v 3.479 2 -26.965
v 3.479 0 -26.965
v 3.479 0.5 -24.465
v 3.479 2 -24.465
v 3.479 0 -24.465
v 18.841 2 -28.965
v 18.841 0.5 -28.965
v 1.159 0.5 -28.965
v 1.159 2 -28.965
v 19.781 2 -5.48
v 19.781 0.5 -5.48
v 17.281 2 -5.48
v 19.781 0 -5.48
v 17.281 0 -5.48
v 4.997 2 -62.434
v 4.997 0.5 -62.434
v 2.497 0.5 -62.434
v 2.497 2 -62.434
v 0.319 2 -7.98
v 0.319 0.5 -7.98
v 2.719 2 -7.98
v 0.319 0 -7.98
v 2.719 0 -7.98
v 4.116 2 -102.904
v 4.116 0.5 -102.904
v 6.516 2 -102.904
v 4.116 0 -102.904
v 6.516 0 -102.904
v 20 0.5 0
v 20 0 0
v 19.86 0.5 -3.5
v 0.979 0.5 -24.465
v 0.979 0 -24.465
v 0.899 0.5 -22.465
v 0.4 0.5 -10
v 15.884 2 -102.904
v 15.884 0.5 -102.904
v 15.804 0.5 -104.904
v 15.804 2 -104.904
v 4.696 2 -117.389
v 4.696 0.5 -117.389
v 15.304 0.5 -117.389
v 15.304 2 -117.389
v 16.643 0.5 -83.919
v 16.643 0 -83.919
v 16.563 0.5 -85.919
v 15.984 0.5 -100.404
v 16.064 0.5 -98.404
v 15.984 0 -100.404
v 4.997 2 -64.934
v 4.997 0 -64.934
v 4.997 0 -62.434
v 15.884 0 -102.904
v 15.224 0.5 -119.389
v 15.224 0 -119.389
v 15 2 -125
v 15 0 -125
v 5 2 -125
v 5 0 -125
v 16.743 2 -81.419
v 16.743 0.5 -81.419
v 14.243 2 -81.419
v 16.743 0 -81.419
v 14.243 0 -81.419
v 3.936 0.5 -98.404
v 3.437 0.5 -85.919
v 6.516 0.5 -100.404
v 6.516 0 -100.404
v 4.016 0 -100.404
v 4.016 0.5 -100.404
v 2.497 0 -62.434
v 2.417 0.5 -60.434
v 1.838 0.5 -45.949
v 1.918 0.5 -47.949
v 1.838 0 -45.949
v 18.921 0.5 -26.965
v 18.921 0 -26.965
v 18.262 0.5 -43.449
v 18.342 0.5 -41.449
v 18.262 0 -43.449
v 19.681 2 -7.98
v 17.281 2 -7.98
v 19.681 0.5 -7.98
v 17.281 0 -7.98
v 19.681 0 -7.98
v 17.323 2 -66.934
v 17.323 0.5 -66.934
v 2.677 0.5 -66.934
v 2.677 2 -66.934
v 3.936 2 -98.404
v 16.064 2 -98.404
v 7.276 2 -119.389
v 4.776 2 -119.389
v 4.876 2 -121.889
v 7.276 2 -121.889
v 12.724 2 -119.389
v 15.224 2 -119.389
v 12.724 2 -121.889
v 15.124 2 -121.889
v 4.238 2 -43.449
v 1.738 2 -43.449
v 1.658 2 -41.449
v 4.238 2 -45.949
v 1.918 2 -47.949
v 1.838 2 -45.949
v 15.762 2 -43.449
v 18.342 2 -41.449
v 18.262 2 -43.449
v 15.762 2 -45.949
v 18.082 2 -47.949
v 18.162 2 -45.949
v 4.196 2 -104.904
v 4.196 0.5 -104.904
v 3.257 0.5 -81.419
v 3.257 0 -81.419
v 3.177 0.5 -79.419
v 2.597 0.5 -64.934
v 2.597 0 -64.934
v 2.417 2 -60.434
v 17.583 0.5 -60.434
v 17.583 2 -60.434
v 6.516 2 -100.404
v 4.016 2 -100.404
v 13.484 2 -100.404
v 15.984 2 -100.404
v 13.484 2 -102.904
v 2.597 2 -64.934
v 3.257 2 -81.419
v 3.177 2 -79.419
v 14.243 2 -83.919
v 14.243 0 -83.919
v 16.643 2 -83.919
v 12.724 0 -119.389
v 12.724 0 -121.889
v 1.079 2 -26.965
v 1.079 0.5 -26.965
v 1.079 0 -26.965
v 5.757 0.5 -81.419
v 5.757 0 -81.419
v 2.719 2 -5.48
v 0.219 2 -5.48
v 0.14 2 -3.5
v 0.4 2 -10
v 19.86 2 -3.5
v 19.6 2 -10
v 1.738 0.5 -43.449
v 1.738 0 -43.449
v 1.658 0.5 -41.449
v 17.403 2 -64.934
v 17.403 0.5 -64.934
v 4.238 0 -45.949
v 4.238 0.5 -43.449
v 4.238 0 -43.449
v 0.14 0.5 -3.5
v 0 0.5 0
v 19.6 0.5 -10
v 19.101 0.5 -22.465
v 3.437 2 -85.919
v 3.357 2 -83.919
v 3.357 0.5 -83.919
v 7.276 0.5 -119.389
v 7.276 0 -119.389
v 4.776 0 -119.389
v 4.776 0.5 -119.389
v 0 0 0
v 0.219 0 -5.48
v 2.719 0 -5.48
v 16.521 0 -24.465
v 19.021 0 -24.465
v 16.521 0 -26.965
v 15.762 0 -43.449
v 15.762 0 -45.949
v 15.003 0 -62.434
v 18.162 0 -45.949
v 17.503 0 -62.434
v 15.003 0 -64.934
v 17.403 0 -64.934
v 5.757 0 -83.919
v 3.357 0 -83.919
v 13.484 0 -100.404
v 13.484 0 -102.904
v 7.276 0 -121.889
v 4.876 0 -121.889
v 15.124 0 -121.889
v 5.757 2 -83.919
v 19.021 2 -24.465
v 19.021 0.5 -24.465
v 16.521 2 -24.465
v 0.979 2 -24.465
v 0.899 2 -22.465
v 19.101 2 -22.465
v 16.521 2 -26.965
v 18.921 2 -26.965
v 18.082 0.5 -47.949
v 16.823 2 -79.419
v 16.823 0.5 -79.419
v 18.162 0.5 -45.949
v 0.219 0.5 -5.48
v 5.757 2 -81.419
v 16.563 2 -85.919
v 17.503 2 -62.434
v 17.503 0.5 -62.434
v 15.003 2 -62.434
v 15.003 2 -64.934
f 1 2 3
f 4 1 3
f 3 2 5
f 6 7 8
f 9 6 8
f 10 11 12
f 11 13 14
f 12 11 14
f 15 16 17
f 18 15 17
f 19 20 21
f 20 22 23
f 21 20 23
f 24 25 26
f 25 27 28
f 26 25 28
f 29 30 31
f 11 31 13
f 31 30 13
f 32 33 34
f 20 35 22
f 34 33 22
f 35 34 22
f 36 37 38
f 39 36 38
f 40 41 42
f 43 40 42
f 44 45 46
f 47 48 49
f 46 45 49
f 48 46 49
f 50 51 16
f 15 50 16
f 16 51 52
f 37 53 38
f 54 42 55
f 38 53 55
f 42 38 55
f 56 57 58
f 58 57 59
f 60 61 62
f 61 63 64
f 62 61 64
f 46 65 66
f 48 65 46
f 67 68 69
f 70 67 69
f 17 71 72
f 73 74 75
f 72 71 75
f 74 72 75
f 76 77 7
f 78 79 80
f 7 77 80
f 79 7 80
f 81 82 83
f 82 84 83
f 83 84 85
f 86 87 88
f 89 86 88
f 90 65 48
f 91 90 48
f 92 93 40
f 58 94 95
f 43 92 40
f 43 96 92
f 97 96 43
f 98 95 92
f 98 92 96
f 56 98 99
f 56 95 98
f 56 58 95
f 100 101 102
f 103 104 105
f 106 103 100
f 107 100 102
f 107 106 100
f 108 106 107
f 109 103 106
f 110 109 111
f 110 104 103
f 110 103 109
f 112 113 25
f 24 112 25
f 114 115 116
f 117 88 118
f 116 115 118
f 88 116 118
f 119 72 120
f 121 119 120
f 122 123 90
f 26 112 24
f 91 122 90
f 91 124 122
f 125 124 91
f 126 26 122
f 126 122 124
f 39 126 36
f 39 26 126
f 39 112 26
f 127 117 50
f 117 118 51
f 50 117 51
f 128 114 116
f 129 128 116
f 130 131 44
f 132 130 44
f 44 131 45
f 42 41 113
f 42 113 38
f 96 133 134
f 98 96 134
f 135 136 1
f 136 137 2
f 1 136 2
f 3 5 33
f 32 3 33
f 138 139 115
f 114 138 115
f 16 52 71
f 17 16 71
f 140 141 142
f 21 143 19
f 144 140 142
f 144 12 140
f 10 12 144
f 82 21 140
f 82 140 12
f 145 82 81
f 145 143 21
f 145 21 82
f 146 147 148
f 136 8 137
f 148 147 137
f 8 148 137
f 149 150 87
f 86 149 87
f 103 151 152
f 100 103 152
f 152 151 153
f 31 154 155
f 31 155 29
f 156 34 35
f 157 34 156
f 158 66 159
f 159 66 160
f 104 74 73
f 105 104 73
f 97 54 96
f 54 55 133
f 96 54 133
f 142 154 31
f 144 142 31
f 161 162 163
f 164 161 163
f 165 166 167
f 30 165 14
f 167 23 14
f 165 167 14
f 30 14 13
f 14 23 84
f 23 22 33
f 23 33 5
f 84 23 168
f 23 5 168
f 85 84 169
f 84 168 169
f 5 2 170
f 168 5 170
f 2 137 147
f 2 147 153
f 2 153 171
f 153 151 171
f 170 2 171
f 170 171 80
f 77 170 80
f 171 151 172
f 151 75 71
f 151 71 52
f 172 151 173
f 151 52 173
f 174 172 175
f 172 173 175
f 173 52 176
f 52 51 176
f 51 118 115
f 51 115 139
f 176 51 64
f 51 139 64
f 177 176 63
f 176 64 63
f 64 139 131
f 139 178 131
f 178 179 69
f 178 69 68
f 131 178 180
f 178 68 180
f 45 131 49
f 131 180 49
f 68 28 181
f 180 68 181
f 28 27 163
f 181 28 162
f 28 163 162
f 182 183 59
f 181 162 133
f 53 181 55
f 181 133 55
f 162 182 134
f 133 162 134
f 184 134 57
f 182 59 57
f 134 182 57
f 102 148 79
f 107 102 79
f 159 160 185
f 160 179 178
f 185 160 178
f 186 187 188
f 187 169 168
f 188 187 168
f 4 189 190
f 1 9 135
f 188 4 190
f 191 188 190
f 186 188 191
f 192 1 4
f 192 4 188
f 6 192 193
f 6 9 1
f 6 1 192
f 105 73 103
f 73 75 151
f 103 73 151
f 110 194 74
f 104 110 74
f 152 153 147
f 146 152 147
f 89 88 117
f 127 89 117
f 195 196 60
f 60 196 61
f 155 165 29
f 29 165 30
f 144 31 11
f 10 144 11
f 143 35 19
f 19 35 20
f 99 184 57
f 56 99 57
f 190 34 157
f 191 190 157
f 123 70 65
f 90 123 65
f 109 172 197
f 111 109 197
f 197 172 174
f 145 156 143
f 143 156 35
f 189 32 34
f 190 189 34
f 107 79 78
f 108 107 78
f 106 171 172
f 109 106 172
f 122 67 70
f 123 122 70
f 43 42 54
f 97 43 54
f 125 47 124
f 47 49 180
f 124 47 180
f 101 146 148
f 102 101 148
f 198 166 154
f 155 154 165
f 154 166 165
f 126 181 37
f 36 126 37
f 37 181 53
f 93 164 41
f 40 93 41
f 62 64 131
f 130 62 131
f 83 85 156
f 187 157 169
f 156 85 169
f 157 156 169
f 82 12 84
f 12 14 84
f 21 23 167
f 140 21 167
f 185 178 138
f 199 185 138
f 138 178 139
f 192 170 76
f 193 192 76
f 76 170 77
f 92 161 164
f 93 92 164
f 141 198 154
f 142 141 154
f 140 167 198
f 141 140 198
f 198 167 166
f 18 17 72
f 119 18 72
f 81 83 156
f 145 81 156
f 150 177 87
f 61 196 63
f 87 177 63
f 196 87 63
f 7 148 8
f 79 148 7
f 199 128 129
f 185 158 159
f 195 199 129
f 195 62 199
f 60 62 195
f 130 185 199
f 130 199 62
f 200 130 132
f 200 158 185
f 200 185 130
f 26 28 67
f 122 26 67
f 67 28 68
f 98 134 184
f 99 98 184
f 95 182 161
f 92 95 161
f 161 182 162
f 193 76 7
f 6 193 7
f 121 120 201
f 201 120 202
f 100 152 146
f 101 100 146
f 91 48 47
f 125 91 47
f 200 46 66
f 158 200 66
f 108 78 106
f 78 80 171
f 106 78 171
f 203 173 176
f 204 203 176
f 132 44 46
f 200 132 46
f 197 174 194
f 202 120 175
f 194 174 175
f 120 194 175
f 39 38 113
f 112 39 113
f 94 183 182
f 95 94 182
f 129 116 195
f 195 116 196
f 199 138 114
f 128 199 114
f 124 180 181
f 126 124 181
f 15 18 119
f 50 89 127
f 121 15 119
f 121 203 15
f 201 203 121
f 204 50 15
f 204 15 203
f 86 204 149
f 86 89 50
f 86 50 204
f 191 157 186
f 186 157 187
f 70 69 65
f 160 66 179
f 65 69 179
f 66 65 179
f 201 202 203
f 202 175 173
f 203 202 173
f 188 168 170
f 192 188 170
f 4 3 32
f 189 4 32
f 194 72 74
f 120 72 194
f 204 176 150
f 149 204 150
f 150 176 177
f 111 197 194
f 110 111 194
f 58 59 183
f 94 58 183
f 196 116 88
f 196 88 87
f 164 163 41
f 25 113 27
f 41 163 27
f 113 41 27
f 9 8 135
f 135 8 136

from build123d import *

# Parameters (mm, degrees)
BOSS_EXTRUDE1_DEPTH = 0.5
BOSS_EXTRUDE2_DEPTH = 1.5


with BuildPart() as part:
    # Sketch2 → Boss-Extrude1 (new body)
    with BuildSketch(Plane(origin=(0, 0, 0), x_dir=(1, 0, 0), z_dir=(0, 1, 0))):
        Polygon((0.219191575, 5.479789367), (0, 0), (20, 0), (19.780808425, 5.479789367), (17.280808425, 5.479789367), (17.280808425, 7.979789367), (19.680808425, 7.979789367), (19.021415697, 24.464607583), (16.521415698, 24.464607583), (16.521415698, 26.964607583), (18.921415697, 26.964607583), (18.262022968, 43.449425798), (15.76202297, 43.449425798), (15.76202297, 45.949425798), (18.162022968, 45.949425798), (17.502630239, 62.434244014), (15.002630242, 62.434244014), (15.002630242, 64.934244014), (17.402630239, 64.934244014), (16.743237511, 81.41906223), (14.243237514, 81.41906223), (14.243237514, 83.91906223), (16.643237511, 83.91906223), (15.983844782, 100.403880446), (13.483844787, 100.403880446), (13.483844787, 102.903880446), (15.883844782, 102.903880446), (15.224452054, 119.388698661), (12.724452059, 119.388698661), (12.724452059, 121.888698661), (15.124452054, 121.888698661), (15, 125), (5, 125), (4.875547946, 121.888698661), (7.275547941, 121.888698661), (7.275547941, 119.388698661), (4.775547941, 119.388698661), (4.116155218, 102.903880446), (6.516155213, 102.903880446), (6.516155213, 100.403880446), (4.016155213, 100.403880446), (3.356762489, 83.91906223), (5.756762486, 83.91906223), (5.756762486, 81.41906223), (3.256762486, 81.41906223), (2.597369761, 64.934244014), (4.997369758, 64.934244014), (4.997369758, 62.434244014), (2.497369758, 62.434244014), (1.837977032, 45.949425798), (4.23797703, 45.949425798), (4.23797703, 43.449425798), (1.73797703, 43.449425798), (1.078584303, 26.964607583), (3.478584302, 26.964607583), (3.478584302, 24.464607583), (0.978584302, 24.464607583), (0.319191575, 7.979789367), (2.719191575, 7.979789367), (2.719191575, 5.479789367), align=None)
    extrude(amount=BOSS_EXTRUDE1_DEPTH)

    # Sketch3 → Boss-Extrude2 (add)
    with BuildSketch(Plane(origin=(0, 0.5, 0), x_dir=(1, 0, 0), z_dir=(0, 1, 0))):
        Polygon((0.219191575, 5.479789367), (0.14, 3.5), (19.86, 3.5), (19.780808425, 5.479789367), (17.280808425, 5.479789367), (17.280808425, 7.979789367), (19.680808425, 7.979789367), (19.6, 10), (0.4, 10), (0.319191575, 7.979789367), (2.719191575, 7.979789367), (2.719191575, 5.479789367), align=None)
        Polygon((0.978584302, 24.464607561), (0.898584302, 22.464607561), (19.101415698, 22.464607561), (19.021415697, 24.464607583), (16.521415698, 24.464607583), (16.521415698, 26.964607583), (18.921415697, 26.964607583), (18.841415697, 28.964607583), (1.158584303, 28.964607583), (1.078584303, 26.964607583), (3.478584302, 26.964607583), (3.478584302, 24.464607583), align=None)
        Polygon((1.73797703, 43.449425755), (1.657977032, 41.449425798), (18.342022968, 41.449425798), (18.262022968, 43.449425798), (15.76202297, 43.449425798), (15.76202297, 45.949425798), (18.162022968, 45.949425798), (18.082022968, 47.949425798), (1.917977032, 47.949425798), (1.837977032, 45.949425798), (4.23797703, 45.949425798), (4.23797703, 43.449425798), align=None)
        Polygon((2.497369758, 62.434243949), (2.417369761, 60.434244014), (17.582630239, 60.434244014), (17.502630239, 62.434244014), (15.002630242, 62.434244014), (15.002630242, 64.934244014), (17.402630239, 64.934244014), (17.322630239, 66.934244014), (2.677369761, 66.934244014), (2.597369761, 64.934244014), (4.997369758, 64.934244014), (4.997369758, 62.434244014), align=None)
        Polygon((3.256762486, 81.419062142), (3.176762489, 79.41906223), (16.823237511, 79.41906223), (16.743237511, 81.41906223), (14.243237514, 81.41906223), (14.243237514, 83.91906223), (16.643237511, 83.91906223), (16.563237511, 85.91906223), (3.436762489, 85.91906223), (3.356762489, 83.91906223), (5.756762486, 83.91906223), (5.756762486, 81.41906223), align=None)
        Polygon((4.016155213, 100.403880336), (3.936155218, 98.403880446), (16.063844782, 98.403880446), (15.983844782, 100.403880446), (13.483844787, 100.403880446), (13.483844787, 102.903880446), (15.883844782, 102.903880446), (15.803844782, 104.903880446), (4.196155218, 104.903880446), (4.116155218, 102.903880446), (6.516155213, 102.903880446), (6.516155213, 100.403880446), align=None)
        Polygon((4.775547941, 119.38869853), (4.695547946, 117.388698661), (15.304452054, 117.388698661), (15.224452054, 119.388698661), (12.724452059, 119.388698661), (12.724452059, 121.888698661), (15.124452054, 121.888698661), (15, 125), (5, 125), (4.875547946, 121.888698661), (7.275547941, 121.888698661), (7.275547941, 119.388698661), align=None)
    extrude(amount=BOSS_EXTRUDE2_DEPTH)


solid = part.part
